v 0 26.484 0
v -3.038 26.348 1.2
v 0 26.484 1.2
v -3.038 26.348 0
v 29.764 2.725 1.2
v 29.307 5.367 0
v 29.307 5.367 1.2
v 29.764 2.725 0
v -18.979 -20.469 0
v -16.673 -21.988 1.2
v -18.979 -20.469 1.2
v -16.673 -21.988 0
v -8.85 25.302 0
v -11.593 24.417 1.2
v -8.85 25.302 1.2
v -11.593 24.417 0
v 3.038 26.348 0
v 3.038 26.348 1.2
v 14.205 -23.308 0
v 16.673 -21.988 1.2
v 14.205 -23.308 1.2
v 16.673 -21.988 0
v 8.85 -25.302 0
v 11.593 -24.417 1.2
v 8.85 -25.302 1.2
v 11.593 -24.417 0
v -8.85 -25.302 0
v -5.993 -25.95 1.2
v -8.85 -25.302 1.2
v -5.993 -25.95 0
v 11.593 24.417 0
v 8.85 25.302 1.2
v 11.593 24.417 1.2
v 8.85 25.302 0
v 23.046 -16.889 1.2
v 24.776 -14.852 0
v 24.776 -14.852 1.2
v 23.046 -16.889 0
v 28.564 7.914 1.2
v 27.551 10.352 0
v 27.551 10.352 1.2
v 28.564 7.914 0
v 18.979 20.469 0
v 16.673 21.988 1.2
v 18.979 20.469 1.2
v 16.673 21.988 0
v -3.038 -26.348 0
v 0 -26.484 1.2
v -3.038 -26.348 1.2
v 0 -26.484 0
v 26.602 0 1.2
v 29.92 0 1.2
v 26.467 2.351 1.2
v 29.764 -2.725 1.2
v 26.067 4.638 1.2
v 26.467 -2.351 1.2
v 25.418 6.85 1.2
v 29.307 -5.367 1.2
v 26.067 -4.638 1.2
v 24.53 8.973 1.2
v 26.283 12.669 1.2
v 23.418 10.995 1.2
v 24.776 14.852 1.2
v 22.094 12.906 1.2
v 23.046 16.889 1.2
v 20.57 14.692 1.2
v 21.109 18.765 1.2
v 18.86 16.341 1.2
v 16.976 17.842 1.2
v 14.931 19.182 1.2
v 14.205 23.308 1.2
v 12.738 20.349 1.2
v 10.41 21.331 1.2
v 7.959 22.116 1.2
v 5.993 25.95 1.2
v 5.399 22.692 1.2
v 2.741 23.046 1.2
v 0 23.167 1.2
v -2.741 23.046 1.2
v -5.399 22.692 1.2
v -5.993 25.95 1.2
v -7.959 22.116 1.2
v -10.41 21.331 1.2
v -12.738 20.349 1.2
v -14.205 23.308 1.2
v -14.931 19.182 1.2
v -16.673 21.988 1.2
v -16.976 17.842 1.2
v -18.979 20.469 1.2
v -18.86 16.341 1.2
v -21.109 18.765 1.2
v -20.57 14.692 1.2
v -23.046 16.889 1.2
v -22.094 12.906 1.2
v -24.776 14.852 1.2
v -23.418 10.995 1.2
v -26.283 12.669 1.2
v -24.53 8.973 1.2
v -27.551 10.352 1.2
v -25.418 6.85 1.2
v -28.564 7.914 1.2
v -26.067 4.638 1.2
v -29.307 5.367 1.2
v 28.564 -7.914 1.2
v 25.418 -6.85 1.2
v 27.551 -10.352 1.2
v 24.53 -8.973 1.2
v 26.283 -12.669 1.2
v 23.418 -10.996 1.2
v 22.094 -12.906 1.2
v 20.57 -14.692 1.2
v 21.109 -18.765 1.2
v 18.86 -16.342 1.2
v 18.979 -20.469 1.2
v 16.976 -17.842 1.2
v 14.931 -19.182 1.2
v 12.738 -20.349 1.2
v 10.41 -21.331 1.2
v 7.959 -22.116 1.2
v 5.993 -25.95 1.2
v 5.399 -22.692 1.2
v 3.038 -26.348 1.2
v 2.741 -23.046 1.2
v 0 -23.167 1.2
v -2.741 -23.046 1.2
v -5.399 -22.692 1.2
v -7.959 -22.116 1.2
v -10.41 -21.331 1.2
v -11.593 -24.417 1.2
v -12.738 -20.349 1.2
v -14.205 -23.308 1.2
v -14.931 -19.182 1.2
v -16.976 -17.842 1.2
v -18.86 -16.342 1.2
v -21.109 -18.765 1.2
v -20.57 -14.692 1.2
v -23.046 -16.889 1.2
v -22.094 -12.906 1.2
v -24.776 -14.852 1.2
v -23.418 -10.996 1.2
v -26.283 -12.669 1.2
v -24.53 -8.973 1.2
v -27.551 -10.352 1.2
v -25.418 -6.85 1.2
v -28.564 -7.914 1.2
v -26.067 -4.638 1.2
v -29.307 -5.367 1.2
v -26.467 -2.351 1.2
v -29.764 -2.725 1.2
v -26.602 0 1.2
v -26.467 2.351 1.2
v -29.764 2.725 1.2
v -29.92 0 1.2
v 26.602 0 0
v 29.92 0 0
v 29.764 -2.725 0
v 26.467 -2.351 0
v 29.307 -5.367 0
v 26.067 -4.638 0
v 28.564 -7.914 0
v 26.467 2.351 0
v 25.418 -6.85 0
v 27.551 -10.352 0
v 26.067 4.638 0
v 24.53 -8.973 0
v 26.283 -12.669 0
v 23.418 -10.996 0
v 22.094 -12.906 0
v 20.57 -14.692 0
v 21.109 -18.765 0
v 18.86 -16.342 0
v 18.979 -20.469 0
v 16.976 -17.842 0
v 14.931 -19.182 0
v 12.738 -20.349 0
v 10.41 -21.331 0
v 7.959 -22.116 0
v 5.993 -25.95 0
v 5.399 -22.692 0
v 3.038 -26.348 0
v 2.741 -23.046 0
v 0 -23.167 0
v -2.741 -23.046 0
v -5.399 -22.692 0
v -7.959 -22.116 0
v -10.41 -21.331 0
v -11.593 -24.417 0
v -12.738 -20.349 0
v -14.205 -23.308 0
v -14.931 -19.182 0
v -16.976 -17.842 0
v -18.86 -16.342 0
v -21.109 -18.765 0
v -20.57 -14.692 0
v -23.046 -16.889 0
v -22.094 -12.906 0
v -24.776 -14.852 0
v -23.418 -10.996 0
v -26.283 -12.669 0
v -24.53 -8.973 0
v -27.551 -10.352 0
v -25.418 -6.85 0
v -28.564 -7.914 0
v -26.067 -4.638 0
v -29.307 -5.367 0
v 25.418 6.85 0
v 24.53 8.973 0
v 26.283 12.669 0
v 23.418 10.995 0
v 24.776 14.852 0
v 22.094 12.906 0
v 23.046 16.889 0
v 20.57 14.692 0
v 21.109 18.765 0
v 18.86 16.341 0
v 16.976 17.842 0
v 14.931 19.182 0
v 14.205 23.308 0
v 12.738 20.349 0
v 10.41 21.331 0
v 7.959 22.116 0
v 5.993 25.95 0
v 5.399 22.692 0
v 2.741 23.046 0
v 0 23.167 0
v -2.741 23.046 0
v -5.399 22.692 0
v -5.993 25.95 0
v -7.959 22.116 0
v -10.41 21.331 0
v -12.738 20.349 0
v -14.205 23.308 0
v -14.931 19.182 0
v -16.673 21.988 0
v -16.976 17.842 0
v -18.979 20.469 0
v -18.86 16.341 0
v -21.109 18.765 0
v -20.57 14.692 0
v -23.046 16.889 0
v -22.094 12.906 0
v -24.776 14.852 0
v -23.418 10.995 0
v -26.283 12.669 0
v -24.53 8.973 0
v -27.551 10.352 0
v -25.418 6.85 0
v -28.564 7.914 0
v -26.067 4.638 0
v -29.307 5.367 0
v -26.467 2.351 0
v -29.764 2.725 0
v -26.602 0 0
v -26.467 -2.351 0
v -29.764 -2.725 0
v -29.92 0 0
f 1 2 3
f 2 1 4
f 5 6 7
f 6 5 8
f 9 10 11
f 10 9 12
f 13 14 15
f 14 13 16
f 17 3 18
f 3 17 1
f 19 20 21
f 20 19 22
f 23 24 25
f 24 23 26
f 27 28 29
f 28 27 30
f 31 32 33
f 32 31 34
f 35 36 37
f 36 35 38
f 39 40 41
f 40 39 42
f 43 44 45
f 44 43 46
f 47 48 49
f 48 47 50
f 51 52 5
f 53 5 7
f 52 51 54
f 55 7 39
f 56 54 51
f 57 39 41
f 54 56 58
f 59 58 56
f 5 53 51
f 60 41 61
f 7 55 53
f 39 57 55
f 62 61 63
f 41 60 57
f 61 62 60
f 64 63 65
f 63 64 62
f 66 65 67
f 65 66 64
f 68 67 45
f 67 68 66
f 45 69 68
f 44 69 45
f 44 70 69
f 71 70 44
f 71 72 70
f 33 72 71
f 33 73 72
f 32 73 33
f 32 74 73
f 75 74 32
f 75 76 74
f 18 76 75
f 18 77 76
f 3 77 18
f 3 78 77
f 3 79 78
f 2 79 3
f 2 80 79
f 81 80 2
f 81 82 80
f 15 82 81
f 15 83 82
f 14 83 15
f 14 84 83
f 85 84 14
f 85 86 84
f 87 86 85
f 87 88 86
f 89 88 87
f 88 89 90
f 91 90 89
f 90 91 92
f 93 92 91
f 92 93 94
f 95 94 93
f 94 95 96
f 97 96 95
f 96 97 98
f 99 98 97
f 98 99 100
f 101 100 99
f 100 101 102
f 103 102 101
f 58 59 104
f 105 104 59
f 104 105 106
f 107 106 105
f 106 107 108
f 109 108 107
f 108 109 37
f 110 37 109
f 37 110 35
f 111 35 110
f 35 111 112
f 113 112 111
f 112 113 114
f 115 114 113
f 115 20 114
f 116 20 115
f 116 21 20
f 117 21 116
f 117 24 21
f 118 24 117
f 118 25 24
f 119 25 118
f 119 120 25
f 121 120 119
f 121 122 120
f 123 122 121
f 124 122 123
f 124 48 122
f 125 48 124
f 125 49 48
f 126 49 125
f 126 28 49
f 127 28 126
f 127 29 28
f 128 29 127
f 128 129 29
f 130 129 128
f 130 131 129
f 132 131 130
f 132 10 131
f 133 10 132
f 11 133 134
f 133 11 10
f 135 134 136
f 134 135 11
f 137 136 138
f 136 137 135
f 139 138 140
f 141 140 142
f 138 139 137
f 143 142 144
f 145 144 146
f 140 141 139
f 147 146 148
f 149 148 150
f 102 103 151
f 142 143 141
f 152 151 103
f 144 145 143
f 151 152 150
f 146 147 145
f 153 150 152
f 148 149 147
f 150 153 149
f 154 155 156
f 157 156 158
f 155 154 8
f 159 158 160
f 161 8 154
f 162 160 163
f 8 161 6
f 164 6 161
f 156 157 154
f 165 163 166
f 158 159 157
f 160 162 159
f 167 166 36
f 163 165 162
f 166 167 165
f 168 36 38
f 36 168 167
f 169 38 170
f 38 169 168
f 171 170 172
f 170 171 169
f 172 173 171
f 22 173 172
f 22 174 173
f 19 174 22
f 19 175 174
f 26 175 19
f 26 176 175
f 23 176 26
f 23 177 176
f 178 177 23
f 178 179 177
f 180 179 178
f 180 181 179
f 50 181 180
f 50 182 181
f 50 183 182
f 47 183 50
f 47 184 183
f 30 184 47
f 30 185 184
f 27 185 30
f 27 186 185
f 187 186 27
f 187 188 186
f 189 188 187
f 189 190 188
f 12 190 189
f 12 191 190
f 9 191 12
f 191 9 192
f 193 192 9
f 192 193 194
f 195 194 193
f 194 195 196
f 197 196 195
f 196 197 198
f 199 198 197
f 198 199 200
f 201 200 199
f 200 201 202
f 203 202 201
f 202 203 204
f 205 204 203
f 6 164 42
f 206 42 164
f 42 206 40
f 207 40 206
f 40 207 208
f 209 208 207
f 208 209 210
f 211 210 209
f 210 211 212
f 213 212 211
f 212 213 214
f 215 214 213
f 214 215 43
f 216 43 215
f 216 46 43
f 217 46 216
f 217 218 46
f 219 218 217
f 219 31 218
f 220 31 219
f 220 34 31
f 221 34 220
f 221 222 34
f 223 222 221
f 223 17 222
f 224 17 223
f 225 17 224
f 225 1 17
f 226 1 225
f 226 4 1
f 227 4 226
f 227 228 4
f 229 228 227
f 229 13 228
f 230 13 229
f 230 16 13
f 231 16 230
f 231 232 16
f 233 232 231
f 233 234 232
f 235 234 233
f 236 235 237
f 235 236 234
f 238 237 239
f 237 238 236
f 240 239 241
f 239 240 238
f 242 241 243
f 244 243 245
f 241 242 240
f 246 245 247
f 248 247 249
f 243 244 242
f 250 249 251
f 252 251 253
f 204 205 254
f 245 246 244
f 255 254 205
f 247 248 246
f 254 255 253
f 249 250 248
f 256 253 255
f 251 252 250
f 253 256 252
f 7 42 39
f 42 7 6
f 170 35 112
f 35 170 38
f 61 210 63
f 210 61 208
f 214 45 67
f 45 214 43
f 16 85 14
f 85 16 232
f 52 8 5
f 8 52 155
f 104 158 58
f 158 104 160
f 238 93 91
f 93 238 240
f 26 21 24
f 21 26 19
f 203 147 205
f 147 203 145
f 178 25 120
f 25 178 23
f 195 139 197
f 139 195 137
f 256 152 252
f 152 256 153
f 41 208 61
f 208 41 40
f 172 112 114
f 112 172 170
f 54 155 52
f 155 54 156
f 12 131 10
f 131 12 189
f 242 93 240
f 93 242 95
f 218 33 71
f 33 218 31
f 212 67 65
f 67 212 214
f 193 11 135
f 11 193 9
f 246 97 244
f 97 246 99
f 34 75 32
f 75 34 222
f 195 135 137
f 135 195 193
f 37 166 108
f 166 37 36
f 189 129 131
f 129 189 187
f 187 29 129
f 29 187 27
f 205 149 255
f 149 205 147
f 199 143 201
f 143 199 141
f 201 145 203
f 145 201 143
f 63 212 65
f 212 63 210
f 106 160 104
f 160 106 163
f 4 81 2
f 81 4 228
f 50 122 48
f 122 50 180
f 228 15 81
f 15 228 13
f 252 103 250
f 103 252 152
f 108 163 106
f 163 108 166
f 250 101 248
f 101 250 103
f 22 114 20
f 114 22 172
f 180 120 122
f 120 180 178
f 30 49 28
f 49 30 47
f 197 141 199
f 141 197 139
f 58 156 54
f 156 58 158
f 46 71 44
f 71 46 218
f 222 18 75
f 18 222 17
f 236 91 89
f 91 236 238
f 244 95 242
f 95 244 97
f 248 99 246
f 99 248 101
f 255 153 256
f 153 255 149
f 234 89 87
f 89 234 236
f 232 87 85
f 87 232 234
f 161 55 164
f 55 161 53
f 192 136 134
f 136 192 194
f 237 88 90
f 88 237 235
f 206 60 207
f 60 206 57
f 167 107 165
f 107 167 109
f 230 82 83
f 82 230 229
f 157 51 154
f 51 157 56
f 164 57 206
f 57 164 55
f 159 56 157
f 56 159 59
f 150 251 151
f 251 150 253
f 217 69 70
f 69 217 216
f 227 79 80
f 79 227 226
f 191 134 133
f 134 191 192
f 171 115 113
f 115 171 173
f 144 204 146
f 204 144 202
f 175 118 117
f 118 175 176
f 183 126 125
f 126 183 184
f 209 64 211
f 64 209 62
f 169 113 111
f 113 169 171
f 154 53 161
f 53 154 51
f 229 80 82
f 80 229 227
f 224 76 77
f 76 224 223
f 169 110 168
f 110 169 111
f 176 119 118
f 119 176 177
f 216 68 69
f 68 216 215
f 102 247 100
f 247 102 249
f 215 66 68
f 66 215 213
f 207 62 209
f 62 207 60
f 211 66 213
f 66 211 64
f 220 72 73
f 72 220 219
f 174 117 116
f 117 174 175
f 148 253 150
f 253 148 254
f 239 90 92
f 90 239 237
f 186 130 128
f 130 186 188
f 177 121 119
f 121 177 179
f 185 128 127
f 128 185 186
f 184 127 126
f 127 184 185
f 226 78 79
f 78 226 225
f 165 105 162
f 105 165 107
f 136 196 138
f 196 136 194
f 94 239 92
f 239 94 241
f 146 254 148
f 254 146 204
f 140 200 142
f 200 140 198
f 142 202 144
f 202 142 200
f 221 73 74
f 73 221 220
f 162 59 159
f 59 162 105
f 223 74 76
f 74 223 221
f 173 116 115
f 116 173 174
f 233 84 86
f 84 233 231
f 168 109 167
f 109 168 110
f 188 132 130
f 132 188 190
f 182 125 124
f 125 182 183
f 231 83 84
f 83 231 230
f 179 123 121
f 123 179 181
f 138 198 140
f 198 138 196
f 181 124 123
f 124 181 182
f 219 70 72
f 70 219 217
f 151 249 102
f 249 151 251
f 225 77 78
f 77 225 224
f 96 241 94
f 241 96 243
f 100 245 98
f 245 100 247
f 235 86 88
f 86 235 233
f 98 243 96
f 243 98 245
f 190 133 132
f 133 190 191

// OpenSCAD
// Module names are of the form poly_<inkscape-path-id>().  As a result,
// you can associate a polygon in this OpenSCAD program with the corresponding
// SVG element in the Inkscape document by looking for the XML element with
// the attribute id="inkscape-path-id".

// fudge value is used to ensure that subtracted solids are a tad taller
// in the z dimension than the polygon being subtracted from.  This helps
// keep the resulting .stl file manifold.
fudge = 0.1;

module poly_path4325(h)
{
  scale([25.4/90, -25.4/90, 1]) union()
  {
    difference()
    {
       linear_extrude(height=h)
         polygon([[-0.000000,-93.840266],[-10.765294,-93.359776],[-21.236569,-91.948685],[-31.358562,-89.652565],[-41.076009,-86.516986],[-50.333645,-82.587519],[-59.076206,-77.909735],[-67.248428,-72.529204],[-74.795047,-66.491497],[-81.660798,-59.842185],[-87.790417,-52.626839],[-93.128640,-44.891029],[-97.620203,-36.680326],[-101.209842,-28.040301],[-103.842292,-19.016525],[-105.462289,-9.654568],[-106.014569,-0.000001],[-105.462289,9.654567],[-103.842292,19.016524],[-101.209842,28.040301],[-97.620203,36.680326],[-93.128640,44.891029],[-87.790417,52.626839],[-81.660798,59.842185],[-74.795047,66.491497],[-67.248428,72.529204],[-59.076206,77.909735],[-50.333645,82.587519],[-41.076009,86.516986],[-31.358562,89.652565],[-21.236569,91.948685],[-10.765294,93.359776],[-0.000000,93.840266],[10.765294,93.359776],[21.236569,91.948685],[31.358562,89.652565],[41.076008,86.516986],[50.333644,82.587519],[59.076204,77.909735],[67.248426,72.529204],[74.795044,66.491497],[81.660795,59.842185],[87.790414,52.626839],[93.128637,44.891029],[97.620200,36.680326],[101.209839,28.040301],[103.842290,19.016524],[105.462288,9.654567],[106.014569,-0.000001],[105.462289,-9.654568],[103.842292,-19.016525],[101.209842,-28.040301],[97.620203,-36.680326],[93.128640,-44.891029],[87.790417,-52.626839],[81.660798,-59.842185],[74.795047,-66.491497],[67.248428,-72.529204],[59.076206,-77.909735],[50.333645,-82.587519],[41.076009,-86.516986],[31.358562,-89.652565],[21.236569,-91.948685],[10.765294,-93.359776],[-0.000000,-93.840266]]);
       translate([0, 0, -fudge])
         linear_extrude(height=h+2*fudge)
           polygon([[-0.000000,-82.086334],[9.713790,-81.658393],[19.129542,-80.403182],[28.201906,-78.363616],[36.885534,-75.582612],[45.135076,-72.103087],[52.905185,-67.967957],[60.150511,-63.220138],[66.825704,-57.902547],[72.885417,-52.058101],[78.284300,-45.729715],[82.977004,-38.960307],[86.918181,-31.792793],[90.062482,-24.270088],[92.364557,-16.435111],[93.779058,-8.330776],[94.260636,-0.000001],[93.779057,8.330790],[92.364554,16.435166],[90.062476,24.270207],[86.918171,31.792993],[82.976990,38.960603],[78.284281,45.730118],[72.885394,52.058618],[66.825677,57.903182],[60.150481,63.220890],[52.905154,67.968822],[45.135045,72.104059],[36.885504,75.583679],[28.201879,78.364763],[19.129521,80.404391],[9.713778,81.659643],[-0.000000,82.087598],[-9.713778,81.659643],[-19.129521,80.404391],[-28.201879,78.364763],[-36.885504,75.583679],[-45.135045,72.104059],[-52.905154,67.968822],[-60.150481,63.220890],[-66.825677,57.903182],[-72.885394,52.058618],[-78.284281,45.730118],[-82.976990,38.960603],[-86.918171,31.792993],[-90.062476,24.270207],[-92.364554,16.435166],[-93.779057,8.330790],[-94.260636,-0.000001],[-93.779058,-8.330776],[-92.364557,-16.435111],[-90.062482,-24.270088],[-86.918181,-31.792793],[-82.977004,-38.960307],[-78.284300,-45.729715],[-72.885417,-52.058101],[-66.825704,-57.902547],[-60.150511,-63.220138],[-52.905185,-67.967957],[-45.135076,-72.103087],[-36.885534,-75.582612],[-28.201906,-78.363616],[-19.129542,-80.403182],[-9.713790,-81.658393],[-0.000000,-82.086334]]);
    }
  }
}

poly_path4325(1.2000000476837158);
